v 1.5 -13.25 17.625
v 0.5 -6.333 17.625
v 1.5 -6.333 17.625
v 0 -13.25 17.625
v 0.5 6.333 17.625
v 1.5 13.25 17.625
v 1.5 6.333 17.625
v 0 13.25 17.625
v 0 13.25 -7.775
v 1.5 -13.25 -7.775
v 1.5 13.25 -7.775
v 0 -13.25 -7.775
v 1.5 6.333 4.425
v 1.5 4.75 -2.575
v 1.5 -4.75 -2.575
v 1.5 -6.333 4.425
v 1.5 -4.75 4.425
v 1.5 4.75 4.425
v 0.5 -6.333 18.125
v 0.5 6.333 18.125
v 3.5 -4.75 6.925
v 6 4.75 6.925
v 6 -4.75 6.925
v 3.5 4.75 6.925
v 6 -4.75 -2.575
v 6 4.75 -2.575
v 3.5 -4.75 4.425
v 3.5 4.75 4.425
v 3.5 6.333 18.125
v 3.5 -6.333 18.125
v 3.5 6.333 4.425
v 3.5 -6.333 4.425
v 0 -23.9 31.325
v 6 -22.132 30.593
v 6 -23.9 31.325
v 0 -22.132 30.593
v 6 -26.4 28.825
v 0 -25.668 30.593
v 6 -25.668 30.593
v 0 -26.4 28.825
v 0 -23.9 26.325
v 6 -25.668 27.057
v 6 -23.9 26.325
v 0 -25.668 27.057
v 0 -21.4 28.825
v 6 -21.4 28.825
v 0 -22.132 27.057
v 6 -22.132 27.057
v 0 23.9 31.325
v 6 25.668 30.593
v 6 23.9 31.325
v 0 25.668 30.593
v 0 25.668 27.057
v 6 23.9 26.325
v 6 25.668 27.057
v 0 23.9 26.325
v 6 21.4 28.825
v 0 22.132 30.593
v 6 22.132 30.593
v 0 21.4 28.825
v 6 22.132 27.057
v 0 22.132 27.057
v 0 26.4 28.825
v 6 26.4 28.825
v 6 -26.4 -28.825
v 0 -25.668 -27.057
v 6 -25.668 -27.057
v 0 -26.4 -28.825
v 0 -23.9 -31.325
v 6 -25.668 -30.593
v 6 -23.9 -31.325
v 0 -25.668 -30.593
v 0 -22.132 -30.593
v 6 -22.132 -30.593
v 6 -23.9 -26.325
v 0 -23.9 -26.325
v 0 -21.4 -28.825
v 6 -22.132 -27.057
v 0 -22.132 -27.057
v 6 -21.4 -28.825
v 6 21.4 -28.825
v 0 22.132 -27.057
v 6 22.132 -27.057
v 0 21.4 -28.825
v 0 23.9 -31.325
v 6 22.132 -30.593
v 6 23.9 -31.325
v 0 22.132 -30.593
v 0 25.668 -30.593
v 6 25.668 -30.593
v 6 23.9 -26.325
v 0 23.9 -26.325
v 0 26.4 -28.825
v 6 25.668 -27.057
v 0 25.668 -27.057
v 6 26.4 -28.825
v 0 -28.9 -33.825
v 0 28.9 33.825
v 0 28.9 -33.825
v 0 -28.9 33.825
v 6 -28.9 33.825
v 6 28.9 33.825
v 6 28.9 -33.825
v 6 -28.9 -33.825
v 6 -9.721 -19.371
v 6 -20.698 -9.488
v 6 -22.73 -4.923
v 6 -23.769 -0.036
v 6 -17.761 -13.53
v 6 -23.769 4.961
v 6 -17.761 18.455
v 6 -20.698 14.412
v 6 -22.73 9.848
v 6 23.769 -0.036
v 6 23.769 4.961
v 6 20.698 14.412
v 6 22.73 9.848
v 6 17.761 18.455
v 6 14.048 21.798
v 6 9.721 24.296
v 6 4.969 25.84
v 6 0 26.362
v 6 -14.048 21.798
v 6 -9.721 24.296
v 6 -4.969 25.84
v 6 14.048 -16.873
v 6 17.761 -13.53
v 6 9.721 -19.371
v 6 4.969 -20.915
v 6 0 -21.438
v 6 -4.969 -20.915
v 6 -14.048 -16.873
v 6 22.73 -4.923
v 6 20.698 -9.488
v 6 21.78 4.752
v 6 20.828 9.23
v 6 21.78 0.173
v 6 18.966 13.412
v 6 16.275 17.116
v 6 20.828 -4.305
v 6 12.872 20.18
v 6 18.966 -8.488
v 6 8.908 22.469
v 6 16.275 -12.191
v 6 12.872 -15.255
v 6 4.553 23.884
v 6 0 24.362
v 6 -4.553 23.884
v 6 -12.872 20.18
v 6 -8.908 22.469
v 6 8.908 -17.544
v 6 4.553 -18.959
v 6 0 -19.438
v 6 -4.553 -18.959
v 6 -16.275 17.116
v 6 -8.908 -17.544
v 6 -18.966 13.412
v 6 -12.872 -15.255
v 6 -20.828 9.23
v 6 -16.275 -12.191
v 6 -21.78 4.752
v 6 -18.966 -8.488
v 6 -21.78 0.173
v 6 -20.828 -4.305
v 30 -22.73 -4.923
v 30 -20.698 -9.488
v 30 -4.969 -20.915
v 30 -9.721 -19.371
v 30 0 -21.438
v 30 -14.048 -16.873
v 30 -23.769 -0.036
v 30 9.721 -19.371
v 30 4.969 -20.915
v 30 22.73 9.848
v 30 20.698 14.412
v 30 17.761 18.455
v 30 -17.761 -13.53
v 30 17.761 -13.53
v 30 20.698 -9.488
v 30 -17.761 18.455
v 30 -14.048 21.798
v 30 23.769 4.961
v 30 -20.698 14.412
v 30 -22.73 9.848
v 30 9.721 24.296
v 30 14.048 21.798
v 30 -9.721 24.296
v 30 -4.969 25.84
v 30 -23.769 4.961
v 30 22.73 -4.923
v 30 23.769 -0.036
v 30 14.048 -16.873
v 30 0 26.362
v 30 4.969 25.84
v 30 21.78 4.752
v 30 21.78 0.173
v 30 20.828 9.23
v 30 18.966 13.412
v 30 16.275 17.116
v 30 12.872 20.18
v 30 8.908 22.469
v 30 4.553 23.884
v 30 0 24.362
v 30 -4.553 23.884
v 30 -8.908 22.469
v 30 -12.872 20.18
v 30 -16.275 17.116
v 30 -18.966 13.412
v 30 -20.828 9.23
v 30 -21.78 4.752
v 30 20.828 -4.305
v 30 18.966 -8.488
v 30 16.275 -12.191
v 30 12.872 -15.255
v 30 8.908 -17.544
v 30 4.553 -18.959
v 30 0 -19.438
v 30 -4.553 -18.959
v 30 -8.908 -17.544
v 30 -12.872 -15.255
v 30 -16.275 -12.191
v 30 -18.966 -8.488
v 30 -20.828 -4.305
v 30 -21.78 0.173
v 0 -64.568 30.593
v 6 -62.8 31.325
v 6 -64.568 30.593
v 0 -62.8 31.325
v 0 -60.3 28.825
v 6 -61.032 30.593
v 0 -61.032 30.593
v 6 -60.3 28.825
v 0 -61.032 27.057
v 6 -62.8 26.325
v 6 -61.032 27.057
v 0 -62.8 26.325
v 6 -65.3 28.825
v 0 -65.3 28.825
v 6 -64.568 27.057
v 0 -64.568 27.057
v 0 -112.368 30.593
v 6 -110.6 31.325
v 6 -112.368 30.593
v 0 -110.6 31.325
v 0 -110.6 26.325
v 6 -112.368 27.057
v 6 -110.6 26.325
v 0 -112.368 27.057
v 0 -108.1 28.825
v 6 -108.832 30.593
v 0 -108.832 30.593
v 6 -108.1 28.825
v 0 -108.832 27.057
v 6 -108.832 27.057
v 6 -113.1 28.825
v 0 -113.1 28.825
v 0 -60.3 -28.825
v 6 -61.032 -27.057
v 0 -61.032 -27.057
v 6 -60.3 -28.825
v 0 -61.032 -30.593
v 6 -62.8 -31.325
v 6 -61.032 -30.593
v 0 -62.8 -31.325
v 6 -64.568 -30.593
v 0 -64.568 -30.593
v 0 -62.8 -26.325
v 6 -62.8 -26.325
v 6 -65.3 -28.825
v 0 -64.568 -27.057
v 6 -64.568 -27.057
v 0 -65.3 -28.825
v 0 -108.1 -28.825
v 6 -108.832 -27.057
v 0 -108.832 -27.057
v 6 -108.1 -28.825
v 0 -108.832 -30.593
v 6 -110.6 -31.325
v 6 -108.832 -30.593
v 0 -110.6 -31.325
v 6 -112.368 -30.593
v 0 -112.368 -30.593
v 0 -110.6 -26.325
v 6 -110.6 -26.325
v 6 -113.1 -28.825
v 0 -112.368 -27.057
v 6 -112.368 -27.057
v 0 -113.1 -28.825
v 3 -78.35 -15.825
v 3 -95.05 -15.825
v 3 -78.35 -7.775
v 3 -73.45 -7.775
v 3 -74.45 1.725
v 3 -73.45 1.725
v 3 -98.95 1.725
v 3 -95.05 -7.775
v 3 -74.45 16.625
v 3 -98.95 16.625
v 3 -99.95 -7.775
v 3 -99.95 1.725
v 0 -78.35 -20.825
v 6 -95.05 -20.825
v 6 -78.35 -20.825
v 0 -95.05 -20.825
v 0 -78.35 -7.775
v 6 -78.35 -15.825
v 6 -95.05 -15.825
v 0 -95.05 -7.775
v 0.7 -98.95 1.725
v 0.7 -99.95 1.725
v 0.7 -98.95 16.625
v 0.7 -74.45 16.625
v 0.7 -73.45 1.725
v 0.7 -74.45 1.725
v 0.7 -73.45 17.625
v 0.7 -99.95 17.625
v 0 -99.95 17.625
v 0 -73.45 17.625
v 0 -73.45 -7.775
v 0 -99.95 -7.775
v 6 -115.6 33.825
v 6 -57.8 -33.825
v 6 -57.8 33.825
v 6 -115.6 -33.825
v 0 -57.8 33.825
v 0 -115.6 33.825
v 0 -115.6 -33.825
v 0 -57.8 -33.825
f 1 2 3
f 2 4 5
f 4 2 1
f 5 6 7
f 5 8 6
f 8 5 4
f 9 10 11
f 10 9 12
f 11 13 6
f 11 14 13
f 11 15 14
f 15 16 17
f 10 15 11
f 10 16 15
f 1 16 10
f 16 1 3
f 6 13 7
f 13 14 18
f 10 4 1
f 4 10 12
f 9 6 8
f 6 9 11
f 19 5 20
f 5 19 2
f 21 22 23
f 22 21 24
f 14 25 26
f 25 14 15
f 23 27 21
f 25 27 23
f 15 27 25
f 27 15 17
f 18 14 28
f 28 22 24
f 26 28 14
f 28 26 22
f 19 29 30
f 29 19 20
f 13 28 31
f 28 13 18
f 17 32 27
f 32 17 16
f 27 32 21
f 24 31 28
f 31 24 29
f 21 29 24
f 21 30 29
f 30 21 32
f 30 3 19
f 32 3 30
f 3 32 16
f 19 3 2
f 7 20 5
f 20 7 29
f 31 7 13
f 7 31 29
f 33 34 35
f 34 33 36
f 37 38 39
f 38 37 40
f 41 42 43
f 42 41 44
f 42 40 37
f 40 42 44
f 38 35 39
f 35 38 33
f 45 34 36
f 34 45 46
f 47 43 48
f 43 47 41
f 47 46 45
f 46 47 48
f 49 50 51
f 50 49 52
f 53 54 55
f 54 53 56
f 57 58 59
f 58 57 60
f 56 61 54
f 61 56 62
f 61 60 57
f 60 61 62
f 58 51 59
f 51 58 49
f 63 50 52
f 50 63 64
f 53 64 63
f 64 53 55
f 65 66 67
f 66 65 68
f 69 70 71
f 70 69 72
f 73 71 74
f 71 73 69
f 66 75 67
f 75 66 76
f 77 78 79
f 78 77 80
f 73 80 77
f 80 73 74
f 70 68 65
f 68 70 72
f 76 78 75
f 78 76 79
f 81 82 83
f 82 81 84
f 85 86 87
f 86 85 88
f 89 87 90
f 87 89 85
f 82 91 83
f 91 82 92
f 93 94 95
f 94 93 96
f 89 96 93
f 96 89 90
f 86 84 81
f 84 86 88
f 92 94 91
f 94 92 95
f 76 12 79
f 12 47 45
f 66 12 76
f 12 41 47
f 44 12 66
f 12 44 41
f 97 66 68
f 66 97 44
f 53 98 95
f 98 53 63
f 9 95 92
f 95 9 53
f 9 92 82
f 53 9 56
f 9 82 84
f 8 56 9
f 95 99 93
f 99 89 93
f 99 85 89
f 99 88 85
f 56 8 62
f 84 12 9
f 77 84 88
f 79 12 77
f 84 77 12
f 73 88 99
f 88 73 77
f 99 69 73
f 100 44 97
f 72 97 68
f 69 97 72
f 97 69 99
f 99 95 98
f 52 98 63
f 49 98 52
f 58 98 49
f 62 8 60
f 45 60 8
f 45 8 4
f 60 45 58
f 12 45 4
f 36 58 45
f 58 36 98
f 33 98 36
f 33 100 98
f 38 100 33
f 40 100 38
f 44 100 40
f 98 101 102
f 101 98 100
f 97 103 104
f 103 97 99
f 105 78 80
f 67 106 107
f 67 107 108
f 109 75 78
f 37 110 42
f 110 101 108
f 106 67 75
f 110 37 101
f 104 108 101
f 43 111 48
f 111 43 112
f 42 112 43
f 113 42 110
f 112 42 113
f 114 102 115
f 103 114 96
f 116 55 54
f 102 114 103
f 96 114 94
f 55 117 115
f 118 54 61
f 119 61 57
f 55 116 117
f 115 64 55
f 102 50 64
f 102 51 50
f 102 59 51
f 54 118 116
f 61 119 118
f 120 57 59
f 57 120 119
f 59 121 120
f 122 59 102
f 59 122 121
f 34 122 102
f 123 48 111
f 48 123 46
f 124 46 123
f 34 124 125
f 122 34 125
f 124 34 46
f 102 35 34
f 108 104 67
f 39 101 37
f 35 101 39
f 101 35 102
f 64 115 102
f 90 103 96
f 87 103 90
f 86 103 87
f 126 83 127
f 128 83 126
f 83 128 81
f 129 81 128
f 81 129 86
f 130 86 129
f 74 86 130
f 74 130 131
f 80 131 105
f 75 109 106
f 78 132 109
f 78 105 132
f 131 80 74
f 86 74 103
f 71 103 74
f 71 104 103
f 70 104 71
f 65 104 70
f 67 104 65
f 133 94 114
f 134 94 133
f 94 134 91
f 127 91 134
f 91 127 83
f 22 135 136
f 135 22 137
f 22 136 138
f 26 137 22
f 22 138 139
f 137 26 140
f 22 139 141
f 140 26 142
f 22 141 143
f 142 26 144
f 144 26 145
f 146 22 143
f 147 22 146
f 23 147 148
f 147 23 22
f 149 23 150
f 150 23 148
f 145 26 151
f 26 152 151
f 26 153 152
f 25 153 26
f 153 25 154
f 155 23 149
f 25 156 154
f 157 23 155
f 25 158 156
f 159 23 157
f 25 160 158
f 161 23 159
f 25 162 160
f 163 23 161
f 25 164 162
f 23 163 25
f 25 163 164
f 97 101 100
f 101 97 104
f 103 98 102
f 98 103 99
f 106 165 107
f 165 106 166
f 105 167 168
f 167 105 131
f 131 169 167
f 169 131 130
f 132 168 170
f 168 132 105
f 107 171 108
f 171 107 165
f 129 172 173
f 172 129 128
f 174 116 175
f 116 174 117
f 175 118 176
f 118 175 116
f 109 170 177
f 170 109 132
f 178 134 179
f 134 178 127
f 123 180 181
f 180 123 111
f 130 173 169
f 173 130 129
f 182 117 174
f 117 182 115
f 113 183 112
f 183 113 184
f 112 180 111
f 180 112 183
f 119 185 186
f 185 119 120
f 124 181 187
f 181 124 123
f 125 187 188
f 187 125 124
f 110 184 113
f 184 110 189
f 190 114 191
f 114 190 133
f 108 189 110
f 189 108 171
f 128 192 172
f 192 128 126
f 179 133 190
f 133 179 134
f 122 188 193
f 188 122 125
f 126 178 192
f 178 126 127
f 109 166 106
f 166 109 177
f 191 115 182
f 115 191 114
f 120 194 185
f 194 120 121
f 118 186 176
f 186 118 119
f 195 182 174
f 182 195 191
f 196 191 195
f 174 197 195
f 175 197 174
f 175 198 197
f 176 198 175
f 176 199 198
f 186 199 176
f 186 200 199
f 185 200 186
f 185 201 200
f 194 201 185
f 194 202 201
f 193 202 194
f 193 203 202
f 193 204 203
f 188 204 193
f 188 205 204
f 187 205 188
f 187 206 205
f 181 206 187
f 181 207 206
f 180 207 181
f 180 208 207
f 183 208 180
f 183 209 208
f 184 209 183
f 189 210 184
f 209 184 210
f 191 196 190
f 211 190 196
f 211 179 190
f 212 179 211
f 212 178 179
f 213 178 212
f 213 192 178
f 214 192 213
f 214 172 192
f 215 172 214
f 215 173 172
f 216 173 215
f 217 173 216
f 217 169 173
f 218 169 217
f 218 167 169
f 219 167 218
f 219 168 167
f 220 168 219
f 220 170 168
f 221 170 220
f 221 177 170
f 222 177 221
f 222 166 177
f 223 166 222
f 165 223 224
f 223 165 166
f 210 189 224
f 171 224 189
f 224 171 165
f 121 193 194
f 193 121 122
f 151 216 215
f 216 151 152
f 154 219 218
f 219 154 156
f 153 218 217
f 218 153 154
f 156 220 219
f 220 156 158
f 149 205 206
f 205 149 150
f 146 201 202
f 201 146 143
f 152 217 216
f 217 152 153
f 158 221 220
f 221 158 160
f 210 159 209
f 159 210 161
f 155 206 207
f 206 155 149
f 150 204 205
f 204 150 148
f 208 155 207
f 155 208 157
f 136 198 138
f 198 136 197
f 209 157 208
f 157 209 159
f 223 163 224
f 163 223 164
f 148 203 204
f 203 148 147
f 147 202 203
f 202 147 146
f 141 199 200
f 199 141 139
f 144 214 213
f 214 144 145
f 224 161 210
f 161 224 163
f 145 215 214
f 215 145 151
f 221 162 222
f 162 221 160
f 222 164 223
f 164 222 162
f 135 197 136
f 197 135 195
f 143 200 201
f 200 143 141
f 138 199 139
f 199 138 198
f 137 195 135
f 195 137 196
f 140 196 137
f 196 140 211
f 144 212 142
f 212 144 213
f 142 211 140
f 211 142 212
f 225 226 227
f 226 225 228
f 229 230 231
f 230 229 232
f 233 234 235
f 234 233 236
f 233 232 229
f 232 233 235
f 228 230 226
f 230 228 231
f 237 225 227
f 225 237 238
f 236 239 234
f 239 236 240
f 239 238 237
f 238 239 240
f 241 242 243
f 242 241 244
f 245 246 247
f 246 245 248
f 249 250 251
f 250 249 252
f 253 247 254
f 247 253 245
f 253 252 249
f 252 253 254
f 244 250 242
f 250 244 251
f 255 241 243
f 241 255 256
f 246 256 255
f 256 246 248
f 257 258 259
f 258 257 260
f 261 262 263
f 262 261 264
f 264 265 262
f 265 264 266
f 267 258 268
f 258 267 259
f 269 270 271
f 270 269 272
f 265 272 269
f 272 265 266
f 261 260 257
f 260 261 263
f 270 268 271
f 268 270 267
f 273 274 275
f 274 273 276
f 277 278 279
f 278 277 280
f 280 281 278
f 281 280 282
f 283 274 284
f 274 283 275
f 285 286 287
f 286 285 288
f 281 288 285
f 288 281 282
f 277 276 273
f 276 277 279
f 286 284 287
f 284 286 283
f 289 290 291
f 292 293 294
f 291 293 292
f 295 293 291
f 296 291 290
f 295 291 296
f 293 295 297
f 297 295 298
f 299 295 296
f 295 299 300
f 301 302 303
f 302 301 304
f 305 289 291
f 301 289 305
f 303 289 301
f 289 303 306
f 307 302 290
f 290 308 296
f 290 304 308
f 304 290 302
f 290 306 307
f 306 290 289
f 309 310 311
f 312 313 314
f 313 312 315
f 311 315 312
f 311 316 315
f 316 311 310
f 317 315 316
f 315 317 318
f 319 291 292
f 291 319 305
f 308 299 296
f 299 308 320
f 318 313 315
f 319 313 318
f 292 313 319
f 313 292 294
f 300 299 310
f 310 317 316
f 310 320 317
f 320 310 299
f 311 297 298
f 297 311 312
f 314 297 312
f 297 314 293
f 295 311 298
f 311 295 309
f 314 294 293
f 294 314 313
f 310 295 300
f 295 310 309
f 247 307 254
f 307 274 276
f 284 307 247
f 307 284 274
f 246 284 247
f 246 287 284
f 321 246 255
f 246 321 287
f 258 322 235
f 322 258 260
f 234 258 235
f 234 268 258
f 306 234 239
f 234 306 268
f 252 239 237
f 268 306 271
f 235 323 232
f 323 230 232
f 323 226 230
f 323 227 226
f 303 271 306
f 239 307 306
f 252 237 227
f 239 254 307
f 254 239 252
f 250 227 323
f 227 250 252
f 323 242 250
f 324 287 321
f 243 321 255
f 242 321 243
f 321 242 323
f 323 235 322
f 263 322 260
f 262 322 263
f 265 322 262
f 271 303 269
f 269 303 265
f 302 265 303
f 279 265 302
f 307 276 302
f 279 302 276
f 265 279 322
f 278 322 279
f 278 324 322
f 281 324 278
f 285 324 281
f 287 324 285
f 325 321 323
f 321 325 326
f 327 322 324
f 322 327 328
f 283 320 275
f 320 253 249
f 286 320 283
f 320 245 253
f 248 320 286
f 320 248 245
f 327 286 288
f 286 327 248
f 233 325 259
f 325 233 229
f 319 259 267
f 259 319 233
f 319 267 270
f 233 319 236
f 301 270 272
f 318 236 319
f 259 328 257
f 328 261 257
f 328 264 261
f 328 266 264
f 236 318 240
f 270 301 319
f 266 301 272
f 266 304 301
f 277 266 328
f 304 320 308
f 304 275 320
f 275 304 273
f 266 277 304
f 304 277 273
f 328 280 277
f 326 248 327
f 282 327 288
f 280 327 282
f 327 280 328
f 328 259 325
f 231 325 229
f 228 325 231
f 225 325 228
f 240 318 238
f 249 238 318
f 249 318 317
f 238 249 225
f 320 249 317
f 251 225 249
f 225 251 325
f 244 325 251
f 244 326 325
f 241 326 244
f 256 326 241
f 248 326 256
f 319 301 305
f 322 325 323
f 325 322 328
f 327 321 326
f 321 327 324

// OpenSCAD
// file: ../cameramount/PiCameraMount.scad
/*
 * openSCAD for a simple mount for the Raspberry PI Camera Module
 *
 * This file is not for standalone use - it's included in to another
 * openSCAN file for including in to another model.
 *
 * Copyright 2015 Peter T Mount
 * 
 * Licensed under the Apache License, Version 2.0 (the "License");
 * you may not use this file except in compliance with the License.
 * You may obtain a copy of the License at
 * 
 * http://www.apache.org/licenses/LICENSE-2.0
 * 
 * Unless required by applicable law or agreed to in writing, software
 * distributed under the License is distributed on an "AS IS" BASIS,
 * WITHOUT WARRANTIES OR CONDITIONS OF ANY KIND, either express or implied.
 * See the License for the specific language governing permissions and
 * limitations under the License.
 *
 */

/*
 * Measured dimensions of a PI Camera Module.
 *
 * These are based on actual measurements and those manually measured by Gert van Loo
 * and published on Scribd:
 *
 *		http://www.scribd.com/doc/142718448/Raspberry-Pi-Camera-Mechanical-Data
 *
 * Width & Depth are the exterior dimensions, width being the edge with the ribbon.
 *
 * We add 1.5 to these to give some room and account for the printer as it seems
 * to give a better fit.
 *
 * y offset is the height from the bottom of the center of the camera lens.
 *
 * ribbon width is just that, if required
 */
piCameraWidth=25 +1.5;
piCameraDepth=23.9 +1.5;
piCameraRibbonWidth=16.2 +0.5;
piCameraLensSize=8 +1.5;
piCameraYOffset=5.1+(piCameraLensSize/2);

/*
 * Module to render a PI camera mount.
 *
 * To use translate it into the required position so that the camera lens
 * is at the origin & pointing along the x axis.
 *
 * Then call piCameraMount(radius,mode)
 *
 * Where:
 *		width	the width of the component
 *		mode	The mode of the render
 *
 * The width must be >30mm as it's used to include the mounting hardware.
 * However you can enlarge it.
 *
 * The mode defines how it's rendered:
 *		0	Render the front panel
 *		1	Render the back panel
 *		2	Render a plain panel with just the mounting holes
 *    3	As 1 but cable exit on back is internal rather than at the bottom of the plate
 */

module piCamera(width,mode) {
	assign(
		tubeRadius=width/2,
		piCameraLensHalf=piCameraLensSize/2,
		piCameraWHalf=piCameraWidth/2,
		piCameraDHalf=piCameraDepth/2,
		offset=piCameraYOffset
	) {
		translate([0,0,piCameraYOffset/2]) union() {
			// Front panel
			difference() {
				if(mode==1 || mode==3)
					translate([6,-tubeRadius,-tubeRadius-offset]) cube([6,width,width+offset]);
				else
					translate([0,-tubeRadius,-tubeRadius-offset]) cube([6,width,width+offset]);

//				translate([4,-tubeRadius-1,-tubeRadius-offset-1]) cube([2,width+2,width+offset+2]);

				if(mode!=2) {
					// Holder for the pi camera module
					translate([4.5,-piCameraWHalf,-piCameraDHalf])
						cube([2.2,piCameraWidth,piCameraDepth]);

					// Holder for components on rear of module
					translate([6,1-piCameraWHalf,1-piCameraDHalf])
						cube([3,piCameraWidth-2,piCameraDepth-2]);
					translate([6,-piCameraWHalf,-piCameraDHalf])
						cube([3,piCameraWidth,9.5]);

					// Hole for the camera lens
					translate([-0.5,-piCameraLensHalf,2-piCameraLensSize])
						cube([6,piCameraLensSize,piCameraLensSize]);

					// Indent for ribbon holder on front of the module
					translate([2.5,-piCameraLensSize*2/3,-0.5])
						cube([3,piCameraLensSize*4/3,piCameraDHalf+1]);
		
					// Space for ribbon cable
					if(mode==1)
						translate([ 5, -piCameraRibbonWidth/2,-tubeRadius-1-offset])
							cube([3,piCameraRibbonWidth,tubeRadius+1+offset]);
					else if(mode==3) {
						translate([ 5, -piCameraRibbonWidth/2,14-tubeRadius-1-offset])
							cube([4,piCameraRibbonWidth,15]);
						translate([ 5, -piCameraRibbonWidth/2,14-tubeRadius-1-offset])
							cube([10,piCameraRibbonWidth,5]);
					}
				}

				// M4 mounting holes
				piCameraHoles(width,15);
			}
		}

	}
}

module piCameraHoles(width,h) {
	assign(tubeRadius=width/2) {
		for(h=[0:3])
			translate([-1,
				(h%2) ? (-tubeRadius+5) : (tubeRadius-5),
				(floor(h/2)) ? (-tubeRadius+5-piCameraYOffset) : (tubeRadius-5)
			])
			rotate([0,90,0])
			cylinder(h=15,r=2.5);
	}
}
// file: ../Common.scad
/*
 * openSCAD Common features
 *
 * This file is not for standalone use - it's included in to another
 * openSCAN file for including in to another model.
 *
 * Copyright 2015 Peter T Mount
 * 
 * Licensed under the Apache License, Version 2.0 (the "License");
 * you may not use this file except in compliance with the License.
 * You may obtain a copy of the License at
 * 
 * http://www.apache.org/licenses/LICENSE-2.0
 * 
 * Unless required by applicable law or agreed to in writing, software
 * distributed under the License is distributed on an "AS IS" BASIS,
 * WITHOUT WARRANTIES OR CONDITIONS OF ANY KIND, either express or implied.
 * See the License for the specific language governing permissions and
 * limitations under the License.
 *
 */

/*
 * Bolt sizes - these are for the holes hence +0.25mm, measurements in radius
 */
M4=2.25;
M5=2.75;
M6=3.25;
// file: eyepiece.scad
/*
 * openSCAD for an adapter for attaching the Raspberry PI Camera Module 
 * to a telescope.
 *
 * This model comes in two parts, the eyepiece mount which attaches directly
 * to the telescope (no eyepiece required) and the back plate.
 *
 * However it's intended that the backplate be incorporated into another model
 * so that the PI itself is mounted with the camera.
 *
 * Copyright 2015 Peter T Mount
 * 
 * Licensed under the Apache License, Version 2.0 (the "License");
 * you may not use this file except in compliance with the License.
 * You may obtain a copy of the License at
 * 
 * http://www.apache.org/licenses/LICENSE-2.0
 * 
 * Unless required by applicable law or agreed to in writing, software
 * distributed under the License is distributed on an "AS IS" BASIS,
 * WITHOUT WARRANTIES OR CONDITIONS OF ANY KIND, either express or implied.
 * See the License for the specific language governing permissions and
 * limitations under the License.
 *
 */

include <../Common.scad>
include <../cameramount/PiCameraMount.scad>

module eyepiece(diam,mode) {
	// eyediam is the eyepiece diameter, adjusting for extruder diameter
	assign(
		eyediam=(diam*25.4)-3
	) {
		assign(
			eyerad=eyediam/2,
			eyewidth=max(50,eyediam+10)
		) {
			if(mode==0 || mode==2) translate([-6,0,0]) eyepieceFront(eyewidth,eyerad);
			if(mode==1 || mode==2) translate([-6,0,0]) eyepieceBack(eyewidth);
			if(mode==3) {
			  	translate([6,0,0]) rotate([0,0,180]) eyepieceFront(eyewidth,eyerad);
				translate([-6,-eyewidth*3/2,0]) eyepieceBack(eyewidth);
			}
		}
	}
}

module eyepieceFront(eyewidth,eyerad) {
	union() {
		piCamera(eyewidth,0);
		translate([-24,0,piCameraYOffset/4]) rotate([0,90,0]) difference() {
			cylinder( h=24,r=eyerad);
			translate([0,0,-2]) cylinder( h=27,r=eyerad-2);
		}
	}
}

module eyepieceBack(eyewidth) {
	piCamera(eyewidth,3);
}
// main file
/*
 * openSCAD for an adapter for attaching the Raspberry PI Camera Module 
 * to a telescope.
 *
 * This model comes in two parts, the eyepiece mount which attaches directly
 * to the telescope (no eyepiece required) and the back plate.
 *
 * However it's intended that the backplate be incorporated into another model
 * so that the PI itself is mounted with the camera.
 *
 * Copyright 2015 Peter T Mount
 * 
 * Licensed under the Apache License, Version 2.0 (the "License");
 * you may not use this file except in compliance with the License.
 * You may obtain a copy of the License at
 * 
 * http://www.apache.org/licenses/LICENSE-2.0
 * 
 * Unless required by applicable law or agreed to in writing, software
 * distributed under the License is distributed on an "AS IS" BASIS,
 * WITHOUT WARRANTIES OR CONDITIONS OF ANY KIND, either express or implied.
 * See the License for the specific language governing permissions and
 * limitations under the License.
 *
 */

include <eyepiece.scad>

eyepiece(2,3);
